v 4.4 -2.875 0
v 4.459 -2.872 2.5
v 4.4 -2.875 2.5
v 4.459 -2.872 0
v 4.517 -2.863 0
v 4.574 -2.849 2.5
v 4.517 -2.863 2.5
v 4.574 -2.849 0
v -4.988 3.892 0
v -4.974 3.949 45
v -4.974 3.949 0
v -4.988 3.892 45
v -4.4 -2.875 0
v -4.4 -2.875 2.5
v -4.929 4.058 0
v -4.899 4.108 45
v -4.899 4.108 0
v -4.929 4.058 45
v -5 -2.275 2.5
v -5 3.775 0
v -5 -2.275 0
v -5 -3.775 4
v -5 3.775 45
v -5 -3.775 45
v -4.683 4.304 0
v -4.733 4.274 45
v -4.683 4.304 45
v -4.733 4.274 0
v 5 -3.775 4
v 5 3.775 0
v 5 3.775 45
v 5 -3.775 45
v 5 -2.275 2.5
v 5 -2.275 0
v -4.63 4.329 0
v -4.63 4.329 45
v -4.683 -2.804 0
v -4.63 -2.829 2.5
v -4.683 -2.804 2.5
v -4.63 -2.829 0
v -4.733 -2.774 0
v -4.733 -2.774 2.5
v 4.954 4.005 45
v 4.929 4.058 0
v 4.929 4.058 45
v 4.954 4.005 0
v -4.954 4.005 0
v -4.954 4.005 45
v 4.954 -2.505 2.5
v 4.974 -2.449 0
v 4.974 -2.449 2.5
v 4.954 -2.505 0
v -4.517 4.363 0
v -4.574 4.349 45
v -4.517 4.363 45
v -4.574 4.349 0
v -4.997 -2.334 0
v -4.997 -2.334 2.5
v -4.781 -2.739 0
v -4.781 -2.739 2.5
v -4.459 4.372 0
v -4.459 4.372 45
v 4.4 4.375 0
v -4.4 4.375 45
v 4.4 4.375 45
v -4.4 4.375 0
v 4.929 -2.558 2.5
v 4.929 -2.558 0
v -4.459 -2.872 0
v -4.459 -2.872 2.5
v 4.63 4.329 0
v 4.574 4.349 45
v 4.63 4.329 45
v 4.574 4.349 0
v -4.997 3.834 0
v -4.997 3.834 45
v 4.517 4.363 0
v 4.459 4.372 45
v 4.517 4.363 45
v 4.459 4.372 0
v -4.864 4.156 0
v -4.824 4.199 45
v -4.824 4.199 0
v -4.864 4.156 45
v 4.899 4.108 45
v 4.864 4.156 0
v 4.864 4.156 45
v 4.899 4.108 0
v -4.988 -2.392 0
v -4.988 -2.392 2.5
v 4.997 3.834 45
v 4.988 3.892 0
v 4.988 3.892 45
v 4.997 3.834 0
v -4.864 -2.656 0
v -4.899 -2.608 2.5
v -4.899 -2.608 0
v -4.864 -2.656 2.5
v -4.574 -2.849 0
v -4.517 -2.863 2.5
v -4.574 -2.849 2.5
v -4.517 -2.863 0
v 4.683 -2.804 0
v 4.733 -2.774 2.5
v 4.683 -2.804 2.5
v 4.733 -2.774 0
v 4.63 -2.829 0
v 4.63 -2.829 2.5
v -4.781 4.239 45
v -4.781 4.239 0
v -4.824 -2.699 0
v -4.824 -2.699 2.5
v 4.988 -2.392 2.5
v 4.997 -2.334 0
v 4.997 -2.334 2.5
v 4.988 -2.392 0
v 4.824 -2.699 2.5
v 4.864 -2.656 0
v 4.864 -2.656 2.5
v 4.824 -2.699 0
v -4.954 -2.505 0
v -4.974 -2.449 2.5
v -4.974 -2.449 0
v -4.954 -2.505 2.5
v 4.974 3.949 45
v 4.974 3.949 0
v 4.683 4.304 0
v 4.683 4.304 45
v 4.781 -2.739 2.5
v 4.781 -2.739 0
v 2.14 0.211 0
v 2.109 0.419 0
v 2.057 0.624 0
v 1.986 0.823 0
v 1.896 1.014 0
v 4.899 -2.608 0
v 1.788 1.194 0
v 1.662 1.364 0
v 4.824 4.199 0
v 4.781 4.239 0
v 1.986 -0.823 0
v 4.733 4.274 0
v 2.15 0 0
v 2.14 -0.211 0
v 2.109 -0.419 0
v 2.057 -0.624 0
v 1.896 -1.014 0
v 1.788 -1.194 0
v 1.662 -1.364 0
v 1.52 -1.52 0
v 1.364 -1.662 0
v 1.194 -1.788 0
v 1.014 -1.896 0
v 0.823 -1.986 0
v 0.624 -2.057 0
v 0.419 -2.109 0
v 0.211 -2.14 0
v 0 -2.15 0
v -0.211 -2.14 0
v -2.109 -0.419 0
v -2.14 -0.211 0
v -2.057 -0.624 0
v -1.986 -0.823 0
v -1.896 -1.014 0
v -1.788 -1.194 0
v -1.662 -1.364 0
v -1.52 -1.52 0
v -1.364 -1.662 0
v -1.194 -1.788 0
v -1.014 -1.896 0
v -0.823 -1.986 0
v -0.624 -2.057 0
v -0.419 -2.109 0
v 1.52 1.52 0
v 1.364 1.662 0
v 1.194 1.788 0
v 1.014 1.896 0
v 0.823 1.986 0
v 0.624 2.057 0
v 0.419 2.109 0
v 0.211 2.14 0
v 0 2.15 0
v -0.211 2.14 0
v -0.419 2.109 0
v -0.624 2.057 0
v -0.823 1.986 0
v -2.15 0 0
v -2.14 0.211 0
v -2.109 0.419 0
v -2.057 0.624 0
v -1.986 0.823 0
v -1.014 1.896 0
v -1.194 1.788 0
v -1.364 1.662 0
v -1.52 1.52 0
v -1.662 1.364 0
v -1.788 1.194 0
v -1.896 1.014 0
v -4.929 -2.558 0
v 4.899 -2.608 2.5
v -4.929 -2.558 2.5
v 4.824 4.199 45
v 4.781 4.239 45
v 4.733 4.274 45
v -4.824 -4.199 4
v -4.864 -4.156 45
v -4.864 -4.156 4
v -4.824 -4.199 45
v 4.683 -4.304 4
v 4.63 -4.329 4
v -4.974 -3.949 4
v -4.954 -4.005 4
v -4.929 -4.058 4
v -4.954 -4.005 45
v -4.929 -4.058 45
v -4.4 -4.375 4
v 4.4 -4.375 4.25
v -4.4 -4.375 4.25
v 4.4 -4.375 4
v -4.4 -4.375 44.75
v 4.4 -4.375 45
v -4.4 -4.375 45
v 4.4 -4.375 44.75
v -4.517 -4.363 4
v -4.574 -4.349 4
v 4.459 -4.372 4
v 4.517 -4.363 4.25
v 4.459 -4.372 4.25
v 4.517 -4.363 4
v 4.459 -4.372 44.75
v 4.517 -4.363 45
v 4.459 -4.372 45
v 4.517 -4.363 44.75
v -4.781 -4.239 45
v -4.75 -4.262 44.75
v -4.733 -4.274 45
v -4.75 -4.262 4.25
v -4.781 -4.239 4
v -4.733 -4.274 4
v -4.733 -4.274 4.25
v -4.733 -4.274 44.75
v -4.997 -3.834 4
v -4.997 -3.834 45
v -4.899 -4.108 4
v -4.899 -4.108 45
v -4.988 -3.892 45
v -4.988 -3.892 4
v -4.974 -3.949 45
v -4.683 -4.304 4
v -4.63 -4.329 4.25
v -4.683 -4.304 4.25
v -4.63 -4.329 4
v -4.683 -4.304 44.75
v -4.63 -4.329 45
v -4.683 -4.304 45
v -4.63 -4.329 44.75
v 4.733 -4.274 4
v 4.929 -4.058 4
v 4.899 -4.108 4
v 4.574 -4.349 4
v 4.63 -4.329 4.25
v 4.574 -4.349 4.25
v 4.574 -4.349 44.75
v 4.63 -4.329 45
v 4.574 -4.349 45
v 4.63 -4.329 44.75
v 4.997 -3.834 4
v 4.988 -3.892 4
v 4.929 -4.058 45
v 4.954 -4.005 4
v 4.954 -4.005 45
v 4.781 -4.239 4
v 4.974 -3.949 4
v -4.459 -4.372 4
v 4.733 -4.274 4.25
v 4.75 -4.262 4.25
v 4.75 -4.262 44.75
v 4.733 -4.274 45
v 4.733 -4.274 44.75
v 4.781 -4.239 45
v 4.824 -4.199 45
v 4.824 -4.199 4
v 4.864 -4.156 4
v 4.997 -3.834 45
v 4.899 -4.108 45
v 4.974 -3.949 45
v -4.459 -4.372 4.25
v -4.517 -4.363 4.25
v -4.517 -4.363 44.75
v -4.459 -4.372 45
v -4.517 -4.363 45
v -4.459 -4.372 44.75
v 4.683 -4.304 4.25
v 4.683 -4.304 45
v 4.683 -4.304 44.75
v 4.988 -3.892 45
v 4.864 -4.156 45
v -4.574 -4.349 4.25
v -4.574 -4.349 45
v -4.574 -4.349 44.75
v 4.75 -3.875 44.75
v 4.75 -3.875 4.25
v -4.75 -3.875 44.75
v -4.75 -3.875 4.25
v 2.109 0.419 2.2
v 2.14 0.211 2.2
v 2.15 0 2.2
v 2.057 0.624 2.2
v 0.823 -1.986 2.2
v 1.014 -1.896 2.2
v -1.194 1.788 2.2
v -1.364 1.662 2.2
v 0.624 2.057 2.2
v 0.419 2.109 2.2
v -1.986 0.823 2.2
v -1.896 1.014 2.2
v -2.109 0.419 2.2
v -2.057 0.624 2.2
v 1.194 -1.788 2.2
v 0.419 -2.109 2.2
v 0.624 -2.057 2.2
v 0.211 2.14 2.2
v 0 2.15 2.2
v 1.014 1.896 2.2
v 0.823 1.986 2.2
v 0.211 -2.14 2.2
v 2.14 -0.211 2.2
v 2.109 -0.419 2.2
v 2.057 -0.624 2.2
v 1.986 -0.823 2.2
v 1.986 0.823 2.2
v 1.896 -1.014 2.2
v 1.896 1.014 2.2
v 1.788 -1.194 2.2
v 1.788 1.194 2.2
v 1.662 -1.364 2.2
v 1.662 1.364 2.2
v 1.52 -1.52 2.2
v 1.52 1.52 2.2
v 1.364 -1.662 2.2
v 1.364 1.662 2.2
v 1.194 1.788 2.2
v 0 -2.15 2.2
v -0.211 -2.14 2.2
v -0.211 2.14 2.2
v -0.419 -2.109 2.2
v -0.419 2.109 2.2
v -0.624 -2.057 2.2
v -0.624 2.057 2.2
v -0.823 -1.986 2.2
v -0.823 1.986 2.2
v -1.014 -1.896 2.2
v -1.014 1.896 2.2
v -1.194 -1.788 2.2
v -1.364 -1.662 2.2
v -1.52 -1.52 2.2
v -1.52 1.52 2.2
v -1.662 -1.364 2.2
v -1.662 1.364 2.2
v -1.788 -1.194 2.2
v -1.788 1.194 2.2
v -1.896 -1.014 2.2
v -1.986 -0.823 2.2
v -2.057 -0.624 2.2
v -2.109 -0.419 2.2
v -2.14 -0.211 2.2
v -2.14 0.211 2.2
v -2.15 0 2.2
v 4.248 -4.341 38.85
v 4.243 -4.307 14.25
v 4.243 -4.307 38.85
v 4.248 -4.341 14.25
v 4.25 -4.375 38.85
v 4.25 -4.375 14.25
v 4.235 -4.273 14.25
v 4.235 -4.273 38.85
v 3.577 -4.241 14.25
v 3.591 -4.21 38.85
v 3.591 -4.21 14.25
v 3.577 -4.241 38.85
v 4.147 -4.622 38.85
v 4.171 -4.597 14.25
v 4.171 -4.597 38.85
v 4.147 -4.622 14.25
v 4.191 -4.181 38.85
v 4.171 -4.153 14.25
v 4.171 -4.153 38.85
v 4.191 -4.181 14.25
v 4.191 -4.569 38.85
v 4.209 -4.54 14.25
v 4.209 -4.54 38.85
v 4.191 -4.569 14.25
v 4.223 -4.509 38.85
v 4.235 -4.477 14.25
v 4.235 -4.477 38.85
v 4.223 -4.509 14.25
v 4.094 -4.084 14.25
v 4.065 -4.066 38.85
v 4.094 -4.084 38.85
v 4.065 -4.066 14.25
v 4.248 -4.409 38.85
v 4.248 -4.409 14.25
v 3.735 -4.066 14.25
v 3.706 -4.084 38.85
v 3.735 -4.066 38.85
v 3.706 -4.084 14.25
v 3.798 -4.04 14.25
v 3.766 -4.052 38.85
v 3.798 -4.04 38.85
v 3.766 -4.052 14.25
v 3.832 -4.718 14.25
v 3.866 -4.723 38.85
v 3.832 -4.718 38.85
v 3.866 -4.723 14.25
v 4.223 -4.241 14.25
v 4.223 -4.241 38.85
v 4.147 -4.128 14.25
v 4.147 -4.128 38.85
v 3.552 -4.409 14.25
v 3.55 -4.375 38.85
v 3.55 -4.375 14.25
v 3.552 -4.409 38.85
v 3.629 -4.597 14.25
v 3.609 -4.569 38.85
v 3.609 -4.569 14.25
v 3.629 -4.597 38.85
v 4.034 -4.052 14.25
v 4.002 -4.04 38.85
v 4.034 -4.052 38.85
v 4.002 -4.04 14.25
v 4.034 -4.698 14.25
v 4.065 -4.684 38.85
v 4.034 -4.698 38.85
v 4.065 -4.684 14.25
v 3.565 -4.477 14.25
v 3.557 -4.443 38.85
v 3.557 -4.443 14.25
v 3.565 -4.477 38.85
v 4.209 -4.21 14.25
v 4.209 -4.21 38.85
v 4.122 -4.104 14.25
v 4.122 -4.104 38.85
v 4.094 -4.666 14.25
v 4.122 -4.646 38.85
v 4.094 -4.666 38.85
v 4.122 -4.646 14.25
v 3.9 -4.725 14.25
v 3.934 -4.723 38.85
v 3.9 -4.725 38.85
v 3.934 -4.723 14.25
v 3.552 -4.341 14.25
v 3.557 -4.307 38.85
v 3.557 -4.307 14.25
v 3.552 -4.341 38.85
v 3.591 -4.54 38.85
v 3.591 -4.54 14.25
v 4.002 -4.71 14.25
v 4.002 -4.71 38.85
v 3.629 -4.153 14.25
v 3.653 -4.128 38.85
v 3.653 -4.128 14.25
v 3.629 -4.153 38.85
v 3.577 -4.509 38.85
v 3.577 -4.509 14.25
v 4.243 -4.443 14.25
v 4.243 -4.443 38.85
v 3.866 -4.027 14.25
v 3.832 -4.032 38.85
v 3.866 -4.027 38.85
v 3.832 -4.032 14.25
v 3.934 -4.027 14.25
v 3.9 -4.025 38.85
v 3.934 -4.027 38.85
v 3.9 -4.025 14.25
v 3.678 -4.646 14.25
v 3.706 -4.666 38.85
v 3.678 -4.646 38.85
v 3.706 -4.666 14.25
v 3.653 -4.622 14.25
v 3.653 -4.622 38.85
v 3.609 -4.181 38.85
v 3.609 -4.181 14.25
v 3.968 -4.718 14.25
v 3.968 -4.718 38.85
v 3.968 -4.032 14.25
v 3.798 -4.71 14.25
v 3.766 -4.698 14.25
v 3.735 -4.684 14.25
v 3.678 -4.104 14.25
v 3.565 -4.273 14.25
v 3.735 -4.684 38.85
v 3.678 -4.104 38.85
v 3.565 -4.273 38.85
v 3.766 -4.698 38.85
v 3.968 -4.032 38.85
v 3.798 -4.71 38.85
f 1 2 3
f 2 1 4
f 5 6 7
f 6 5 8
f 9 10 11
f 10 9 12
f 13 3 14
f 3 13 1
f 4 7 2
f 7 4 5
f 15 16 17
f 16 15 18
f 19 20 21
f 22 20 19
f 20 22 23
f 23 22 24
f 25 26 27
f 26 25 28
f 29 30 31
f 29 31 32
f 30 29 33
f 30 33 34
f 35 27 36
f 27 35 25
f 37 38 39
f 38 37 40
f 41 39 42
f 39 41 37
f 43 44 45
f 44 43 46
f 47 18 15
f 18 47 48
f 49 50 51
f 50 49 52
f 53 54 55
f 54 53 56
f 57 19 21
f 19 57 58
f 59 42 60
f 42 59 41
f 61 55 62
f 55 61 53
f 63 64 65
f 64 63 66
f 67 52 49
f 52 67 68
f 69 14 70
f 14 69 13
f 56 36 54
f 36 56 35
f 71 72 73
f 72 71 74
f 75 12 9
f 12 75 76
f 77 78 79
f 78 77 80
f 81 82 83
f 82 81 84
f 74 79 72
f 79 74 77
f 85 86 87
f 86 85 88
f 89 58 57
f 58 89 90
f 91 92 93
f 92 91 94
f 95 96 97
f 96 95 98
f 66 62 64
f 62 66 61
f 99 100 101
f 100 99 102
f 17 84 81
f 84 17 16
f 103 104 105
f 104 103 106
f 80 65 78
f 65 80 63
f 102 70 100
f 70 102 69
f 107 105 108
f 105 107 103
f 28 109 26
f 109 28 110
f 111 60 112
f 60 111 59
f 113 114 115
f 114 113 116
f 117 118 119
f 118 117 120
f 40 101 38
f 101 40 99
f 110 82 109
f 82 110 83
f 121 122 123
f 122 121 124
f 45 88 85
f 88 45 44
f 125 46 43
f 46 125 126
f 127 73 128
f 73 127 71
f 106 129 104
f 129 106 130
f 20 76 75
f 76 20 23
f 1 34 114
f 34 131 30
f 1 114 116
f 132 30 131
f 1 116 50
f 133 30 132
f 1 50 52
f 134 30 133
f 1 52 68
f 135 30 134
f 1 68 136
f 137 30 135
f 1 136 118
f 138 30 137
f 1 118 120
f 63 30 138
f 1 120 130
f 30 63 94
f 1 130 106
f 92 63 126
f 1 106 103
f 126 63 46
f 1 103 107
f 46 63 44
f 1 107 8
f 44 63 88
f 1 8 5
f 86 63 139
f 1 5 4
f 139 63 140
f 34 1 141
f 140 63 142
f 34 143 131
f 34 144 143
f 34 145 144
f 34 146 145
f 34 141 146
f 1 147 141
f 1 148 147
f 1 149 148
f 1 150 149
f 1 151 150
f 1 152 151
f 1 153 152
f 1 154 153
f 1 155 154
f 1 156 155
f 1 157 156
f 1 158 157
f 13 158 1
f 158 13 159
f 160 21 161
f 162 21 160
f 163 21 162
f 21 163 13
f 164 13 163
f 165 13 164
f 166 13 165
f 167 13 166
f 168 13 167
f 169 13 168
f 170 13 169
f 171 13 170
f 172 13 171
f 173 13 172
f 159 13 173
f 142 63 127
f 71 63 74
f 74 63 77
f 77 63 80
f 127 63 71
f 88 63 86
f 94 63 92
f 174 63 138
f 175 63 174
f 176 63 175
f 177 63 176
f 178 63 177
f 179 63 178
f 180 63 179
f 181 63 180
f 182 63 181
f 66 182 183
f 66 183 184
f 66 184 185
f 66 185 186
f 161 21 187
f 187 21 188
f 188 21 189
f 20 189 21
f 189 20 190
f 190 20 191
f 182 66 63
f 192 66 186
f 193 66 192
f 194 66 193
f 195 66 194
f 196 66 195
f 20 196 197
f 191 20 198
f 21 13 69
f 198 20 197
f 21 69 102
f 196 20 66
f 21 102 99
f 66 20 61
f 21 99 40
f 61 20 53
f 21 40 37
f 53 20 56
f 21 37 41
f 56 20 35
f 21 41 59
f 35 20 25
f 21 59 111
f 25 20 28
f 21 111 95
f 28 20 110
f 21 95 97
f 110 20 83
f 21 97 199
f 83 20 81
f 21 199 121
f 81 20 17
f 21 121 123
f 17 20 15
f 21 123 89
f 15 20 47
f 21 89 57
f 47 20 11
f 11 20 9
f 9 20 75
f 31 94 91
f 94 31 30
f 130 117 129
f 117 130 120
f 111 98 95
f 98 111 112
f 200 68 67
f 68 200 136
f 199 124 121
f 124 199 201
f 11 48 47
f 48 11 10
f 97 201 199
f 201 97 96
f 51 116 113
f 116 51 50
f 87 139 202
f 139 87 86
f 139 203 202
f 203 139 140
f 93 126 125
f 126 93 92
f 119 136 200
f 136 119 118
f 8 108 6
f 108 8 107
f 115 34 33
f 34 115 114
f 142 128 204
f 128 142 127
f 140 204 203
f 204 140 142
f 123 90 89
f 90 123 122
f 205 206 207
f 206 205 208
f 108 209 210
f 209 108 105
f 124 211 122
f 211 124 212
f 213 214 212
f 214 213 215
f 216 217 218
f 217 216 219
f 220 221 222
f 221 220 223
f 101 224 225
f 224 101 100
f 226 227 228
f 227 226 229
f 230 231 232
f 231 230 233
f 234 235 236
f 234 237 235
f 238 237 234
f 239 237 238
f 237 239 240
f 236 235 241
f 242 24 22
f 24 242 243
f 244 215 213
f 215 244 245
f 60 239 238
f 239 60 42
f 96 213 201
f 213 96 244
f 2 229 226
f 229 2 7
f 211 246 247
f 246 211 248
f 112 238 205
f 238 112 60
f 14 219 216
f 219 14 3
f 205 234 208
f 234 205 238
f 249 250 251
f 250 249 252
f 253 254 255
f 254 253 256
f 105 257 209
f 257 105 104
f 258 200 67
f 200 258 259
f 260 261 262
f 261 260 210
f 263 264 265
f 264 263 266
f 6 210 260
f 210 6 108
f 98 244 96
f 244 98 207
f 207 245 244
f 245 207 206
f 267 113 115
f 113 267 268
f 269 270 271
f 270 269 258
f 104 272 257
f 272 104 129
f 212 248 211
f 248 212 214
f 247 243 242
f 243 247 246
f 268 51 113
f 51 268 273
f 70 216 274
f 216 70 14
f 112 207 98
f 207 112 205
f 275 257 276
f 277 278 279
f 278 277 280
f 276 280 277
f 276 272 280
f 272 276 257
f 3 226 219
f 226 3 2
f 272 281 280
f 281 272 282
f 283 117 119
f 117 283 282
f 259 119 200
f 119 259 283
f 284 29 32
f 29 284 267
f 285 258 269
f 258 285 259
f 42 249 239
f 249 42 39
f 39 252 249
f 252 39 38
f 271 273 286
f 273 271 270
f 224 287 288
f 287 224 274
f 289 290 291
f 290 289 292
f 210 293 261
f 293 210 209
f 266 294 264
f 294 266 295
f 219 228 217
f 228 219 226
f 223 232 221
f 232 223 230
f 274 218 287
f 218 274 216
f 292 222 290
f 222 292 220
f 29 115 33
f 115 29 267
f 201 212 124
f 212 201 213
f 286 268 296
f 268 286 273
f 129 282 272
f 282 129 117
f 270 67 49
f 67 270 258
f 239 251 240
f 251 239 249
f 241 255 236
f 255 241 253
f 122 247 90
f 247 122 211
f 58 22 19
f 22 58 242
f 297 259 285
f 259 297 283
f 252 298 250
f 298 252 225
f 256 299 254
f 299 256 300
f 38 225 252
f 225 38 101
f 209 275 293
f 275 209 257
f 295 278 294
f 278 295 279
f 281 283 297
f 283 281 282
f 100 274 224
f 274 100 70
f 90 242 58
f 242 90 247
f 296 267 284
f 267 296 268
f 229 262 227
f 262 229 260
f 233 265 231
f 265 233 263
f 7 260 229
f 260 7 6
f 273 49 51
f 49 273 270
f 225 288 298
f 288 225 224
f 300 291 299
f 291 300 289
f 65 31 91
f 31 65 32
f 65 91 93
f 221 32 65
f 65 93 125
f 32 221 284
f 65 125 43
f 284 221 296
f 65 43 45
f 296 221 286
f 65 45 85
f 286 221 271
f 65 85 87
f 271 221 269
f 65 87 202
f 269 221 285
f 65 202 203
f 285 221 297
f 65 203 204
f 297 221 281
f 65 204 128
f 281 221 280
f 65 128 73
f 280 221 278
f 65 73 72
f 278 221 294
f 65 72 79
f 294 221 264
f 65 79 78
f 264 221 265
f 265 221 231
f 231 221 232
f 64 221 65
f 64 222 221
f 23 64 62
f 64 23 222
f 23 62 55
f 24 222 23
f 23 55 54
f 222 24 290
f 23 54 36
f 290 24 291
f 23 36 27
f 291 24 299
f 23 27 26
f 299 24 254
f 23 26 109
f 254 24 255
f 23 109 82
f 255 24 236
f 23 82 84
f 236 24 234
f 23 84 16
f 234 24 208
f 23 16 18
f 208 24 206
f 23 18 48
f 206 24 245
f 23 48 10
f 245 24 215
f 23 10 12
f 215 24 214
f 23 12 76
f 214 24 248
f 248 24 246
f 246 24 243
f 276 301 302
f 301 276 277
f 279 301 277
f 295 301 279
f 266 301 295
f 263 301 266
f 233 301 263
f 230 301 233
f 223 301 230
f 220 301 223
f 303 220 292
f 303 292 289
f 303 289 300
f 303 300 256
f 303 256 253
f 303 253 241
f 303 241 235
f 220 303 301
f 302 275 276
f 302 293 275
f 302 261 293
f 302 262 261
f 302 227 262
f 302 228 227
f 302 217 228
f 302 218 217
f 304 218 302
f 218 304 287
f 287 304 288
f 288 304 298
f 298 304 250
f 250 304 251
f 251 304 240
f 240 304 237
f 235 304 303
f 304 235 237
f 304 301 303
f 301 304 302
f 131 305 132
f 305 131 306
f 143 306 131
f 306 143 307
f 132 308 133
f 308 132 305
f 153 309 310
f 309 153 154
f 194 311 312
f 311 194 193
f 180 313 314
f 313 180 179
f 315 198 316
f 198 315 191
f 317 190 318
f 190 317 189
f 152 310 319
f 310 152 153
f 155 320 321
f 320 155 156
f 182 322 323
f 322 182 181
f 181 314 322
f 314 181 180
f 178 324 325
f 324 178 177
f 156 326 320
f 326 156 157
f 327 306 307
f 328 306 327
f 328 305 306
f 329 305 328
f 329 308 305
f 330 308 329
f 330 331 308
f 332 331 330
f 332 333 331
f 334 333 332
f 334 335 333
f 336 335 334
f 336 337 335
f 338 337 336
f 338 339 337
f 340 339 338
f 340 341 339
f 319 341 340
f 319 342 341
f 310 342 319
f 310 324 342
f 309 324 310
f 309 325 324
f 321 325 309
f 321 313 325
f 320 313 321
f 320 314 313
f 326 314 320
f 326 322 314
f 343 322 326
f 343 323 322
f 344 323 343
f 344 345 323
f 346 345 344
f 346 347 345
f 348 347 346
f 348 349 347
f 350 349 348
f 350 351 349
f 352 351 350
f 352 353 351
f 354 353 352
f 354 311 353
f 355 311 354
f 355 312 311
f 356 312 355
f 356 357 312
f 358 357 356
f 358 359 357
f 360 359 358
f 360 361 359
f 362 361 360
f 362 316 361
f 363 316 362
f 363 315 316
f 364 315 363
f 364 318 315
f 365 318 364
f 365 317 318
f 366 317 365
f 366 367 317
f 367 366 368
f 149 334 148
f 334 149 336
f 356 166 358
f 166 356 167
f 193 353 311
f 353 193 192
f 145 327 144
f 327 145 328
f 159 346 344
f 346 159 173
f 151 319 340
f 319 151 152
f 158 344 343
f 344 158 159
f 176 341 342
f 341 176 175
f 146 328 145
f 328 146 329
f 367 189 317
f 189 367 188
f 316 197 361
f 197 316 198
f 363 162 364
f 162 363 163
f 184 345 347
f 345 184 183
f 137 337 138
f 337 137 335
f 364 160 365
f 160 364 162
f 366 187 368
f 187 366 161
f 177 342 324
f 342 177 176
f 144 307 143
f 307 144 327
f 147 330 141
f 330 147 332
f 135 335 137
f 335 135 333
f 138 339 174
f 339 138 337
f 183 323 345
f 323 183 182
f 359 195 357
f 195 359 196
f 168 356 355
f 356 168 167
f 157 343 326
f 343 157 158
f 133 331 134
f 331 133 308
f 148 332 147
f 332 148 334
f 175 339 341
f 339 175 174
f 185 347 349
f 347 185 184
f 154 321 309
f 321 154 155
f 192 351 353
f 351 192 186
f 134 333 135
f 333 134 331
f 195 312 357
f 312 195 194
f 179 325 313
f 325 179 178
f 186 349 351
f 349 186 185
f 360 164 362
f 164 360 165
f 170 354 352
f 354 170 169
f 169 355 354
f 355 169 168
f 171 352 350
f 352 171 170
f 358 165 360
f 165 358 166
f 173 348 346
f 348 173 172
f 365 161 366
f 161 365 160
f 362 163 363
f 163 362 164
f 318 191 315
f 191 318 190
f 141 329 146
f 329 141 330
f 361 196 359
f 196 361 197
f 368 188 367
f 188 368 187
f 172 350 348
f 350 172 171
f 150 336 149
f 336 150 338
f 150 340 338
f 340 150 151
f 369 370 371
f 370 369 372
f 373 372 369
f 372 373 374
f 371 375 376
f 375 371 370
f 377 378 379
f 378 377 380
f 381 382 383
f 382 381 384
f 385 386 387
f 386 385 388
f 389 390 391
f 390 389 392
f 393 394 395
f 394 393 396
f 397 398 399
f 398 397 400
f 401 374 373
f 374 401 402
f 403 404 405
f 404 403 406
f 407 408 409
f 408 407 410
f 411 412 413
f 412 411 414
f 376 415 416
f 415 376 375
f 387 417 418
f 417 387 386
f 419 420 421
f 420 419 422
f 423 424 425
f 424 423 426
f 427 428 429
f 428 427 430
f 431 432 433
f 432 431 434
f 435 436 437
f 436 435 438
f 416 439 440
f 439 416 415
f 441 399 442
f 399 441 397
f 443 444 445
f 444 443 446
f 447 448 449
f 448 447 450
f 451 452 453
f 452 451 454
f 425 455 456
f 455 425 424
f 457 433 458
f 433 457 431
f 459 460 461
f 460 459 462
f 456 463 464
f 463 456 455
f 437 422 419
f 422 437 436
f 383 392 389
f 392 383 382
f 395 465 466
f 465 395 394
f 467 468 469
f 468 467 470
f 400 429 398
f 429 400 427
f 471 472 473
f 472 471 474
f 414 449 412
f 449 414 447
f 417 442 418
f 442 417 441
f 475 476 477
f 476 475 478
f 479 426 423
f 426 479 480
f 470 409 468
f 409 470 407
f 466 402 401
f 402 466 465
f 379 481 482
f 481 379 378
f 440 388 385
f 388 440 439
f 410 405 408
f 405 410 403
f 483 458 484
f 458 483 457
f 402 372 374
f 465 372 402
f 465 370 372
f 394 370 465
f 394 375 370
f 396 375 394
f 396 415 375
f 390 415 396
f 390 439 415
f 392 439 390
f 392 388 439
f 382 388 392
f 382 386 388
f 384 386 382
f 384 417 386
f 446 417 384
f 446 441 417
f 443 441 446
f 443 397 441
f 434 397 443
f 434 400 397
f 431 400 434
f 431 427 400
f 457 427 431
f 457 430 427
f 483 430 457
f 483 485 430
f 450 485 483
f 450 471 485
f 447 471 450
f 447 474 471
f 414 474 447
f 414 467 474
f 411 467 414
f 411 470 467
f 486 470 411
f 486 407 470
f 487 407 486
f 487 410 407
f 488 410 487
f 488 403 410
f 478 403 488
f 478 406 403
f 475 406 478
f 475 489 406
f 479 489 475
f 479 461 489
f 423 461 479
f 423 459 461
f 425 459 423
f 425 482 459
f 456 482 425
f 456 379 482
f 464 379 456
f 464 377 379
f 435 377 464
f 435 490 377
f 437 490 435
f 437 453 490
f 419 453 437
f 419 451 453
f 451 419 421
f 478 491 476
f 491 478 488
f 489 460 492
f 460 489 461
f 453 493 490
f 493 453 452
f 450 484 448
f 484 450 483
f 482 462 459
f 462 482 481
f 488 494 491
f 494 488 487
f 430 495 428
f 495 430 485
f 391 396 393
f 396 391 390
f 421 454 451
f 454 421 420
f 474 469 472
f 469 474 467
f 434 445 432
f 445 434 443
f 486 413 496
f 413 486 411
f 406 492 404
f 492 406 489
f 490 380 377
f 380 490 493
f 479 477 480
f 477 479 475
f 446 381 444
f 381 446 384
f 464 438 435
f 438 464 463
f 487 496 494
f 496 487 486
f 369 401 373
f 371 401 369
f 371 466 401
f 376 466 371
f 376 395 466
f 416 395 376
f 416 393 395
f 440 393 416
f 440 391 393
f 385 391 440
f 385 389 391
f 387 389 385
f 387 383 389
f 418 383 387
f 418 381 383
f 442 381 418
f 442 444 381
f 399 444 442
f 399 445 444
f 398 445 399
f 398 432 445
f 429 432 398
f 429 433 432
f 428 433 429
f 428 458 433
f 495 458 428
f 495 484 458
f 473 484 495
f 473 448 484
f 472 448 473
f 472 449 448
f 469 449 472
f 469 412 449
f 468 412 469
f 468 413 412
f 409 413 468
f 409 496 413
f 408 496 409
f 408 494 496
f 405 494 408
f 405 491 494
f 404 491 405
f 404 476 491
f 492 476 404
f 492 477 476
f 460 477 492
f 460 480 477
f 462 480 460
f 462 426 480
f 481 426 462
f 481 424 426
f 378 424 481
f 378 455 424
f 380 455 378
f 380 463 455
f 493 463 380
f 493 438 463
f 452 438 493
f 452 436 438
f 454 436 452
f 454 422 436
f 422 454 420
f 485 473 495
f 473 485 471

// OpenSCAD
// bathroom / cabinet — a tall bathroom storage cabinet: recessed door leaves with raised bar
// handles on the front face, standing on the same set-back plinth the rest of the set's
// carcasses do (base_unit() in lib/common.scad).
//
// Everything is on the FRONT FACE, which is where a cabinet's doors are and the only face of
// this token with room for them: at 1:40 a 40x35 cabinet is 10 x 8.75 mm on the plan but
// 10 x 45 mm across the front, the biggest face it has. The top face is left plain, because a
// real cabinet's top is a plain panel — what tells you which way the token faces, from above
// as well as by touch, are the handles standing proud of the front.
//
// The handles are modelled and not engraved, and they are the one place in the set where
// something stands off a face: a handle is the part of a cabinet that sticks out, a 0.4 mm
// groove says nothing under a fingertip, and a half-round bar running up a door is a plain
// VERTICAL PRISM — every layer lands squarely on the one below, so it prints off the front
// face with no overhang at all and nothing thin enough to snap. That is what makes it worth
// it here where a knob or a grip rail (see unit_fronts) does the job everywhere else: it
// leaves the token Handle_d/2 (~0.35 mm, under 1.5 cm real) deeper than its footprint at the
// front, on the side that faces the room.
//
// Width/Depth are the real-world footprint in cm: a slim floor-standing storage
// cabinet, wider than it is deep. Height is the real carcass height — tall bathroom
// storage, up past head height — shrunk by the plan scale like the footprint (see
// printed_h() in lib/common.scad).

include <../lib/common.scad>

Width  = 40;   // cm
Depth  = 35;   // cm
Height = 180;  // cm — a tall storage column

// the printed height, mm: Height at the plan scale
Print_h = printed_h(Height);

// The doors. A leaf is about Door_width cm wide, so a 40 cm cabinet comes out as
// the single door it really has, and a wider one splits into a pair — the count
// is not hard-coded, the same way washbasin.scad derives its fronts.
Show_doors  = true;
Doors       = 0;    // door leaves (0 = auto, see door_count())
Door_width  = 40;   // cm, nominal width of one leaf
// The cabinet has no worktop of its own — the leaves run the full height of the carcass over
// the plinth, as a larder's do (kitchen/cabinet.scad).
Slab = 0;

// The handles: a half-round bar up each leaf, on the edge it opens from. Printed
// mm and fractions — hardware, so it stays the same at any scale.
Show_handles = true;
Handle_d     = 0.7;   // bar diameter; it is centred on the face, so half of it
                      // is buried in the door and half stands proud
Handle_span  = 0.6;   // how much of the door's height the bar runs, as a fraction
Handle_z     = 0.55;  // where its middle sits up the door, likewise
Handle_inset = 1.1;   // in from the leaf's opening edge — enough to clear both
                      // the seam groove and a rounded corner

// Magnet pocket in the bottom face (0 = none). One central pocket is enough to
// stop a piece this small sliding; see Magnet_* in lib/common.scad. A 35 cm-deep
// cabinet is 8.75 mm across at 1:40 — wide enough for the 4 mm disc; anything
// narrower drops to the 2 mm one on its own.
Magnets = 1;

// ---- derived geometry -------------------------------------------------------
// How many leaves the front splits into, and the band of carcass face they fill — from the
// top of the plinth's flare to the top of the piece, since it has no worktop.
function door_count() = Doors > 0 ? Doors
                                 : max(1, round(Width / Door_width));
function door_z0() = unit_face_z0(Width, Depth, Print_h, Slab);
function door_z1() = unit_face_z1(Width, Depth, Print_h, Slab);
function door_h()  = door_z1() - door_z0();
// The x of a leaf's two edges, printed mm from the centre of the piece.
function leaf_lo(i, n) = -cm(Width) / 2 + cm(Width) * i / n;
function leaf_hi(i, n) = -cm(Width) / 2 + cm(Width) * (i + 1) / n;
// Where leaf <i>'s handle goes: on the edge it opens from, which is the edge
// facing the middle of the cabinet — a pair of doors opens outwards from the
// seam between them. A lone door is hinged on the left and opens on the right.
function handle_x(i, n) =
    let (lo = leaf_lo(i, n), hi = leaf_hi(i, n))
    (n == 1 || abs(hi) <= abs(lo)) ? hi - Handle_inset
                                   : lo + Handle_inset;

cabinet();

module cabinet() {
    union() {
        difference() {
            base_unit(Width, Depth, Print_h, Slab);
            // the leaves, recessed into the carcass face; no grip slot cut into them, since
            // this cabinet carries real handles instead
            if (Show_doors)
                unit_fronts(Width, Depth, door_z0(), door_z1(),
                            door_count(), 1, Slab, grip = false);
            if (Magnets > 0)
                magnets(Width, unit_plinth_d(Width, Depth), Magnets);
        }
        // added last, so nothing cuts into them
        if (Show_handles)
            for (i = [0 : door_count() - 1]) handle(handle_x(i, door_count()));
    }
}

// A handle: a bar running up the door, centred on the front face so half of it is
// buried in the leaf and half stands proud. A vertical prism — every layer lands
// squarely on the one below, so it needs no support. Add it to the solid.
module handle(cx) {
    h = door_h() * Handle_span;
    translate([cx, -cm(Depth) / 2, door_z0() + door_h() * Handle_z - h / 2])
        cylinder(h = h, d = Handle_d);
}
